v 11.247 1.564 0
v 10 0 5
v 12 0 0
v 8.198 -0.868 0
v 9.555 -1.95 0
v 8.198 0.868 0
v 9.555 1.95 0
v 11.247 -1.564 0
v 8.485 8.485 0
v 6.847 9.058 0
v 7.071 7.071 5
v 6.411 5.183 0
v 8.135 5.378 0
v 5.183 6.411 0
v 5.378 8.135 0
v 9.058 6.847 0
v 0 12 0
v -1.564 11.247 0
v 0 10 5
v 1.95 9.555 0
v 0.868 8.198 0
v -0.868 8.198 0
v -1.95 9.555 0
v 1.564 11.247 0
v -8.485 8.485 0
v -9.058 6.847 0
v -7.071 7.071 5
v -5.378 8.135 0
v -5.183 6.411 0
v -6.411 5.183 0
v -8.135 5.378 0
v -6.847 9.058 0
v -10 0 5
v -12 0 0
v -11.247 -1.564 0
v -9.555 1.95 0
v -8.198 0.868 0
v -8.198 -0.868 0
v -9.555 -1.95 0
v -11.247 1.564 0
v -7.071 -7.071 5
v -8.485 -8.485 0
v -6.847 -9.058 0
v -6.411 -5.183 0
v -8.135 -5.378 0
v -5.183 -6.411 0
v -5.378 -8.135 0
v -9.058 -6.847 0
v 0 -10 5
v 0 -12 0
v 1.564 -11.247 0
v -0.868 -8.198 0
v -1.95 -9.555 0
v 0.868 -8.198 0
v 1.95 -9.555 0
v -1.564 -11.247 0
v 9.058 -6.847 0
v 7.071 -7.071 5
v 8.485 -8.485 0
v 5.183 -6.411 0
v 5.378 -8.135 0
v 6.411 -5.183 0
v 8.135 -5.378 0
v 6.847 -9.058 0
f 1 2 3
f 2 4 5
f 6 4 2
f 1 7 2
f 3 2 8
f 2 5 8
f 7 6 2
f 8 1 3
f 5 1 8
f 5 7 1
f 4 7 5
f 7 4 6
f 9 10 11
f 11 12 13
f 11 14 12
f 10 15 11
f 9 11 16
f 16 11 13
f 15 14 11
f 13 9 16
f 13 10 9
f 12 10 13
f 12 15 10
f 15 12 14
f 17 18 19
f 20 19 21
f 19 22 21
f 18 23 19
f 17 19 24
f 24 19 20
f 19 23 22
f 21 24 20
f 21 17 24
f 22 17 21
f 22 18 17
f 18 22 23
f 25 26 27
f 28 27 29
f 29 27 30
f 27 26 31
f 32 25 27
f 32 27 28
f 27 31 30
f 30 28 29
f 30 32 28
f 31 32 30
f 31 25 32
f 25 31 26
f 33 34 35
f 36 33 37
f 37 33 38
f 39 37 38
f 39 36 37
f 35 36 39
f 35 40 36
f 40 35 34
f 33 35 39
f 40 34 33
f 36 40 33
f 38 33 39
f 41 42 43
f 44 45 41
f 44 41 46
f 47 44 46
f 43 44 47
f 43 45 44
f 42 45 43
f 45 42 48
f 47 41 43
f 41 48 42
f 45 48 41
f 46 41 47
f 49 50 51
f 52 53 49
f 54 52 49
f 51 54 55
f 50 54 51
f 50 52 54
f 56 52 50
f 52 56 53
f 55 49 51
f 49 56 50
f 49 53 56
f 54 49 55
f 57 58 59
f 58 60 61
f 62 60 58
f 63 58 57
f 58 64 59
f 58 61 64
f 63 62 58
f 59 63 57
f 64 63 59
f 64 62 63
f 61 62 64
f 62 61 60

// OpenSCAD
for (angle=[0:45:315]) {
    rotate([0, 0, angle]) translate([10, 0, 0]) cylinder(h=5, r1=2, r2=0);
}
